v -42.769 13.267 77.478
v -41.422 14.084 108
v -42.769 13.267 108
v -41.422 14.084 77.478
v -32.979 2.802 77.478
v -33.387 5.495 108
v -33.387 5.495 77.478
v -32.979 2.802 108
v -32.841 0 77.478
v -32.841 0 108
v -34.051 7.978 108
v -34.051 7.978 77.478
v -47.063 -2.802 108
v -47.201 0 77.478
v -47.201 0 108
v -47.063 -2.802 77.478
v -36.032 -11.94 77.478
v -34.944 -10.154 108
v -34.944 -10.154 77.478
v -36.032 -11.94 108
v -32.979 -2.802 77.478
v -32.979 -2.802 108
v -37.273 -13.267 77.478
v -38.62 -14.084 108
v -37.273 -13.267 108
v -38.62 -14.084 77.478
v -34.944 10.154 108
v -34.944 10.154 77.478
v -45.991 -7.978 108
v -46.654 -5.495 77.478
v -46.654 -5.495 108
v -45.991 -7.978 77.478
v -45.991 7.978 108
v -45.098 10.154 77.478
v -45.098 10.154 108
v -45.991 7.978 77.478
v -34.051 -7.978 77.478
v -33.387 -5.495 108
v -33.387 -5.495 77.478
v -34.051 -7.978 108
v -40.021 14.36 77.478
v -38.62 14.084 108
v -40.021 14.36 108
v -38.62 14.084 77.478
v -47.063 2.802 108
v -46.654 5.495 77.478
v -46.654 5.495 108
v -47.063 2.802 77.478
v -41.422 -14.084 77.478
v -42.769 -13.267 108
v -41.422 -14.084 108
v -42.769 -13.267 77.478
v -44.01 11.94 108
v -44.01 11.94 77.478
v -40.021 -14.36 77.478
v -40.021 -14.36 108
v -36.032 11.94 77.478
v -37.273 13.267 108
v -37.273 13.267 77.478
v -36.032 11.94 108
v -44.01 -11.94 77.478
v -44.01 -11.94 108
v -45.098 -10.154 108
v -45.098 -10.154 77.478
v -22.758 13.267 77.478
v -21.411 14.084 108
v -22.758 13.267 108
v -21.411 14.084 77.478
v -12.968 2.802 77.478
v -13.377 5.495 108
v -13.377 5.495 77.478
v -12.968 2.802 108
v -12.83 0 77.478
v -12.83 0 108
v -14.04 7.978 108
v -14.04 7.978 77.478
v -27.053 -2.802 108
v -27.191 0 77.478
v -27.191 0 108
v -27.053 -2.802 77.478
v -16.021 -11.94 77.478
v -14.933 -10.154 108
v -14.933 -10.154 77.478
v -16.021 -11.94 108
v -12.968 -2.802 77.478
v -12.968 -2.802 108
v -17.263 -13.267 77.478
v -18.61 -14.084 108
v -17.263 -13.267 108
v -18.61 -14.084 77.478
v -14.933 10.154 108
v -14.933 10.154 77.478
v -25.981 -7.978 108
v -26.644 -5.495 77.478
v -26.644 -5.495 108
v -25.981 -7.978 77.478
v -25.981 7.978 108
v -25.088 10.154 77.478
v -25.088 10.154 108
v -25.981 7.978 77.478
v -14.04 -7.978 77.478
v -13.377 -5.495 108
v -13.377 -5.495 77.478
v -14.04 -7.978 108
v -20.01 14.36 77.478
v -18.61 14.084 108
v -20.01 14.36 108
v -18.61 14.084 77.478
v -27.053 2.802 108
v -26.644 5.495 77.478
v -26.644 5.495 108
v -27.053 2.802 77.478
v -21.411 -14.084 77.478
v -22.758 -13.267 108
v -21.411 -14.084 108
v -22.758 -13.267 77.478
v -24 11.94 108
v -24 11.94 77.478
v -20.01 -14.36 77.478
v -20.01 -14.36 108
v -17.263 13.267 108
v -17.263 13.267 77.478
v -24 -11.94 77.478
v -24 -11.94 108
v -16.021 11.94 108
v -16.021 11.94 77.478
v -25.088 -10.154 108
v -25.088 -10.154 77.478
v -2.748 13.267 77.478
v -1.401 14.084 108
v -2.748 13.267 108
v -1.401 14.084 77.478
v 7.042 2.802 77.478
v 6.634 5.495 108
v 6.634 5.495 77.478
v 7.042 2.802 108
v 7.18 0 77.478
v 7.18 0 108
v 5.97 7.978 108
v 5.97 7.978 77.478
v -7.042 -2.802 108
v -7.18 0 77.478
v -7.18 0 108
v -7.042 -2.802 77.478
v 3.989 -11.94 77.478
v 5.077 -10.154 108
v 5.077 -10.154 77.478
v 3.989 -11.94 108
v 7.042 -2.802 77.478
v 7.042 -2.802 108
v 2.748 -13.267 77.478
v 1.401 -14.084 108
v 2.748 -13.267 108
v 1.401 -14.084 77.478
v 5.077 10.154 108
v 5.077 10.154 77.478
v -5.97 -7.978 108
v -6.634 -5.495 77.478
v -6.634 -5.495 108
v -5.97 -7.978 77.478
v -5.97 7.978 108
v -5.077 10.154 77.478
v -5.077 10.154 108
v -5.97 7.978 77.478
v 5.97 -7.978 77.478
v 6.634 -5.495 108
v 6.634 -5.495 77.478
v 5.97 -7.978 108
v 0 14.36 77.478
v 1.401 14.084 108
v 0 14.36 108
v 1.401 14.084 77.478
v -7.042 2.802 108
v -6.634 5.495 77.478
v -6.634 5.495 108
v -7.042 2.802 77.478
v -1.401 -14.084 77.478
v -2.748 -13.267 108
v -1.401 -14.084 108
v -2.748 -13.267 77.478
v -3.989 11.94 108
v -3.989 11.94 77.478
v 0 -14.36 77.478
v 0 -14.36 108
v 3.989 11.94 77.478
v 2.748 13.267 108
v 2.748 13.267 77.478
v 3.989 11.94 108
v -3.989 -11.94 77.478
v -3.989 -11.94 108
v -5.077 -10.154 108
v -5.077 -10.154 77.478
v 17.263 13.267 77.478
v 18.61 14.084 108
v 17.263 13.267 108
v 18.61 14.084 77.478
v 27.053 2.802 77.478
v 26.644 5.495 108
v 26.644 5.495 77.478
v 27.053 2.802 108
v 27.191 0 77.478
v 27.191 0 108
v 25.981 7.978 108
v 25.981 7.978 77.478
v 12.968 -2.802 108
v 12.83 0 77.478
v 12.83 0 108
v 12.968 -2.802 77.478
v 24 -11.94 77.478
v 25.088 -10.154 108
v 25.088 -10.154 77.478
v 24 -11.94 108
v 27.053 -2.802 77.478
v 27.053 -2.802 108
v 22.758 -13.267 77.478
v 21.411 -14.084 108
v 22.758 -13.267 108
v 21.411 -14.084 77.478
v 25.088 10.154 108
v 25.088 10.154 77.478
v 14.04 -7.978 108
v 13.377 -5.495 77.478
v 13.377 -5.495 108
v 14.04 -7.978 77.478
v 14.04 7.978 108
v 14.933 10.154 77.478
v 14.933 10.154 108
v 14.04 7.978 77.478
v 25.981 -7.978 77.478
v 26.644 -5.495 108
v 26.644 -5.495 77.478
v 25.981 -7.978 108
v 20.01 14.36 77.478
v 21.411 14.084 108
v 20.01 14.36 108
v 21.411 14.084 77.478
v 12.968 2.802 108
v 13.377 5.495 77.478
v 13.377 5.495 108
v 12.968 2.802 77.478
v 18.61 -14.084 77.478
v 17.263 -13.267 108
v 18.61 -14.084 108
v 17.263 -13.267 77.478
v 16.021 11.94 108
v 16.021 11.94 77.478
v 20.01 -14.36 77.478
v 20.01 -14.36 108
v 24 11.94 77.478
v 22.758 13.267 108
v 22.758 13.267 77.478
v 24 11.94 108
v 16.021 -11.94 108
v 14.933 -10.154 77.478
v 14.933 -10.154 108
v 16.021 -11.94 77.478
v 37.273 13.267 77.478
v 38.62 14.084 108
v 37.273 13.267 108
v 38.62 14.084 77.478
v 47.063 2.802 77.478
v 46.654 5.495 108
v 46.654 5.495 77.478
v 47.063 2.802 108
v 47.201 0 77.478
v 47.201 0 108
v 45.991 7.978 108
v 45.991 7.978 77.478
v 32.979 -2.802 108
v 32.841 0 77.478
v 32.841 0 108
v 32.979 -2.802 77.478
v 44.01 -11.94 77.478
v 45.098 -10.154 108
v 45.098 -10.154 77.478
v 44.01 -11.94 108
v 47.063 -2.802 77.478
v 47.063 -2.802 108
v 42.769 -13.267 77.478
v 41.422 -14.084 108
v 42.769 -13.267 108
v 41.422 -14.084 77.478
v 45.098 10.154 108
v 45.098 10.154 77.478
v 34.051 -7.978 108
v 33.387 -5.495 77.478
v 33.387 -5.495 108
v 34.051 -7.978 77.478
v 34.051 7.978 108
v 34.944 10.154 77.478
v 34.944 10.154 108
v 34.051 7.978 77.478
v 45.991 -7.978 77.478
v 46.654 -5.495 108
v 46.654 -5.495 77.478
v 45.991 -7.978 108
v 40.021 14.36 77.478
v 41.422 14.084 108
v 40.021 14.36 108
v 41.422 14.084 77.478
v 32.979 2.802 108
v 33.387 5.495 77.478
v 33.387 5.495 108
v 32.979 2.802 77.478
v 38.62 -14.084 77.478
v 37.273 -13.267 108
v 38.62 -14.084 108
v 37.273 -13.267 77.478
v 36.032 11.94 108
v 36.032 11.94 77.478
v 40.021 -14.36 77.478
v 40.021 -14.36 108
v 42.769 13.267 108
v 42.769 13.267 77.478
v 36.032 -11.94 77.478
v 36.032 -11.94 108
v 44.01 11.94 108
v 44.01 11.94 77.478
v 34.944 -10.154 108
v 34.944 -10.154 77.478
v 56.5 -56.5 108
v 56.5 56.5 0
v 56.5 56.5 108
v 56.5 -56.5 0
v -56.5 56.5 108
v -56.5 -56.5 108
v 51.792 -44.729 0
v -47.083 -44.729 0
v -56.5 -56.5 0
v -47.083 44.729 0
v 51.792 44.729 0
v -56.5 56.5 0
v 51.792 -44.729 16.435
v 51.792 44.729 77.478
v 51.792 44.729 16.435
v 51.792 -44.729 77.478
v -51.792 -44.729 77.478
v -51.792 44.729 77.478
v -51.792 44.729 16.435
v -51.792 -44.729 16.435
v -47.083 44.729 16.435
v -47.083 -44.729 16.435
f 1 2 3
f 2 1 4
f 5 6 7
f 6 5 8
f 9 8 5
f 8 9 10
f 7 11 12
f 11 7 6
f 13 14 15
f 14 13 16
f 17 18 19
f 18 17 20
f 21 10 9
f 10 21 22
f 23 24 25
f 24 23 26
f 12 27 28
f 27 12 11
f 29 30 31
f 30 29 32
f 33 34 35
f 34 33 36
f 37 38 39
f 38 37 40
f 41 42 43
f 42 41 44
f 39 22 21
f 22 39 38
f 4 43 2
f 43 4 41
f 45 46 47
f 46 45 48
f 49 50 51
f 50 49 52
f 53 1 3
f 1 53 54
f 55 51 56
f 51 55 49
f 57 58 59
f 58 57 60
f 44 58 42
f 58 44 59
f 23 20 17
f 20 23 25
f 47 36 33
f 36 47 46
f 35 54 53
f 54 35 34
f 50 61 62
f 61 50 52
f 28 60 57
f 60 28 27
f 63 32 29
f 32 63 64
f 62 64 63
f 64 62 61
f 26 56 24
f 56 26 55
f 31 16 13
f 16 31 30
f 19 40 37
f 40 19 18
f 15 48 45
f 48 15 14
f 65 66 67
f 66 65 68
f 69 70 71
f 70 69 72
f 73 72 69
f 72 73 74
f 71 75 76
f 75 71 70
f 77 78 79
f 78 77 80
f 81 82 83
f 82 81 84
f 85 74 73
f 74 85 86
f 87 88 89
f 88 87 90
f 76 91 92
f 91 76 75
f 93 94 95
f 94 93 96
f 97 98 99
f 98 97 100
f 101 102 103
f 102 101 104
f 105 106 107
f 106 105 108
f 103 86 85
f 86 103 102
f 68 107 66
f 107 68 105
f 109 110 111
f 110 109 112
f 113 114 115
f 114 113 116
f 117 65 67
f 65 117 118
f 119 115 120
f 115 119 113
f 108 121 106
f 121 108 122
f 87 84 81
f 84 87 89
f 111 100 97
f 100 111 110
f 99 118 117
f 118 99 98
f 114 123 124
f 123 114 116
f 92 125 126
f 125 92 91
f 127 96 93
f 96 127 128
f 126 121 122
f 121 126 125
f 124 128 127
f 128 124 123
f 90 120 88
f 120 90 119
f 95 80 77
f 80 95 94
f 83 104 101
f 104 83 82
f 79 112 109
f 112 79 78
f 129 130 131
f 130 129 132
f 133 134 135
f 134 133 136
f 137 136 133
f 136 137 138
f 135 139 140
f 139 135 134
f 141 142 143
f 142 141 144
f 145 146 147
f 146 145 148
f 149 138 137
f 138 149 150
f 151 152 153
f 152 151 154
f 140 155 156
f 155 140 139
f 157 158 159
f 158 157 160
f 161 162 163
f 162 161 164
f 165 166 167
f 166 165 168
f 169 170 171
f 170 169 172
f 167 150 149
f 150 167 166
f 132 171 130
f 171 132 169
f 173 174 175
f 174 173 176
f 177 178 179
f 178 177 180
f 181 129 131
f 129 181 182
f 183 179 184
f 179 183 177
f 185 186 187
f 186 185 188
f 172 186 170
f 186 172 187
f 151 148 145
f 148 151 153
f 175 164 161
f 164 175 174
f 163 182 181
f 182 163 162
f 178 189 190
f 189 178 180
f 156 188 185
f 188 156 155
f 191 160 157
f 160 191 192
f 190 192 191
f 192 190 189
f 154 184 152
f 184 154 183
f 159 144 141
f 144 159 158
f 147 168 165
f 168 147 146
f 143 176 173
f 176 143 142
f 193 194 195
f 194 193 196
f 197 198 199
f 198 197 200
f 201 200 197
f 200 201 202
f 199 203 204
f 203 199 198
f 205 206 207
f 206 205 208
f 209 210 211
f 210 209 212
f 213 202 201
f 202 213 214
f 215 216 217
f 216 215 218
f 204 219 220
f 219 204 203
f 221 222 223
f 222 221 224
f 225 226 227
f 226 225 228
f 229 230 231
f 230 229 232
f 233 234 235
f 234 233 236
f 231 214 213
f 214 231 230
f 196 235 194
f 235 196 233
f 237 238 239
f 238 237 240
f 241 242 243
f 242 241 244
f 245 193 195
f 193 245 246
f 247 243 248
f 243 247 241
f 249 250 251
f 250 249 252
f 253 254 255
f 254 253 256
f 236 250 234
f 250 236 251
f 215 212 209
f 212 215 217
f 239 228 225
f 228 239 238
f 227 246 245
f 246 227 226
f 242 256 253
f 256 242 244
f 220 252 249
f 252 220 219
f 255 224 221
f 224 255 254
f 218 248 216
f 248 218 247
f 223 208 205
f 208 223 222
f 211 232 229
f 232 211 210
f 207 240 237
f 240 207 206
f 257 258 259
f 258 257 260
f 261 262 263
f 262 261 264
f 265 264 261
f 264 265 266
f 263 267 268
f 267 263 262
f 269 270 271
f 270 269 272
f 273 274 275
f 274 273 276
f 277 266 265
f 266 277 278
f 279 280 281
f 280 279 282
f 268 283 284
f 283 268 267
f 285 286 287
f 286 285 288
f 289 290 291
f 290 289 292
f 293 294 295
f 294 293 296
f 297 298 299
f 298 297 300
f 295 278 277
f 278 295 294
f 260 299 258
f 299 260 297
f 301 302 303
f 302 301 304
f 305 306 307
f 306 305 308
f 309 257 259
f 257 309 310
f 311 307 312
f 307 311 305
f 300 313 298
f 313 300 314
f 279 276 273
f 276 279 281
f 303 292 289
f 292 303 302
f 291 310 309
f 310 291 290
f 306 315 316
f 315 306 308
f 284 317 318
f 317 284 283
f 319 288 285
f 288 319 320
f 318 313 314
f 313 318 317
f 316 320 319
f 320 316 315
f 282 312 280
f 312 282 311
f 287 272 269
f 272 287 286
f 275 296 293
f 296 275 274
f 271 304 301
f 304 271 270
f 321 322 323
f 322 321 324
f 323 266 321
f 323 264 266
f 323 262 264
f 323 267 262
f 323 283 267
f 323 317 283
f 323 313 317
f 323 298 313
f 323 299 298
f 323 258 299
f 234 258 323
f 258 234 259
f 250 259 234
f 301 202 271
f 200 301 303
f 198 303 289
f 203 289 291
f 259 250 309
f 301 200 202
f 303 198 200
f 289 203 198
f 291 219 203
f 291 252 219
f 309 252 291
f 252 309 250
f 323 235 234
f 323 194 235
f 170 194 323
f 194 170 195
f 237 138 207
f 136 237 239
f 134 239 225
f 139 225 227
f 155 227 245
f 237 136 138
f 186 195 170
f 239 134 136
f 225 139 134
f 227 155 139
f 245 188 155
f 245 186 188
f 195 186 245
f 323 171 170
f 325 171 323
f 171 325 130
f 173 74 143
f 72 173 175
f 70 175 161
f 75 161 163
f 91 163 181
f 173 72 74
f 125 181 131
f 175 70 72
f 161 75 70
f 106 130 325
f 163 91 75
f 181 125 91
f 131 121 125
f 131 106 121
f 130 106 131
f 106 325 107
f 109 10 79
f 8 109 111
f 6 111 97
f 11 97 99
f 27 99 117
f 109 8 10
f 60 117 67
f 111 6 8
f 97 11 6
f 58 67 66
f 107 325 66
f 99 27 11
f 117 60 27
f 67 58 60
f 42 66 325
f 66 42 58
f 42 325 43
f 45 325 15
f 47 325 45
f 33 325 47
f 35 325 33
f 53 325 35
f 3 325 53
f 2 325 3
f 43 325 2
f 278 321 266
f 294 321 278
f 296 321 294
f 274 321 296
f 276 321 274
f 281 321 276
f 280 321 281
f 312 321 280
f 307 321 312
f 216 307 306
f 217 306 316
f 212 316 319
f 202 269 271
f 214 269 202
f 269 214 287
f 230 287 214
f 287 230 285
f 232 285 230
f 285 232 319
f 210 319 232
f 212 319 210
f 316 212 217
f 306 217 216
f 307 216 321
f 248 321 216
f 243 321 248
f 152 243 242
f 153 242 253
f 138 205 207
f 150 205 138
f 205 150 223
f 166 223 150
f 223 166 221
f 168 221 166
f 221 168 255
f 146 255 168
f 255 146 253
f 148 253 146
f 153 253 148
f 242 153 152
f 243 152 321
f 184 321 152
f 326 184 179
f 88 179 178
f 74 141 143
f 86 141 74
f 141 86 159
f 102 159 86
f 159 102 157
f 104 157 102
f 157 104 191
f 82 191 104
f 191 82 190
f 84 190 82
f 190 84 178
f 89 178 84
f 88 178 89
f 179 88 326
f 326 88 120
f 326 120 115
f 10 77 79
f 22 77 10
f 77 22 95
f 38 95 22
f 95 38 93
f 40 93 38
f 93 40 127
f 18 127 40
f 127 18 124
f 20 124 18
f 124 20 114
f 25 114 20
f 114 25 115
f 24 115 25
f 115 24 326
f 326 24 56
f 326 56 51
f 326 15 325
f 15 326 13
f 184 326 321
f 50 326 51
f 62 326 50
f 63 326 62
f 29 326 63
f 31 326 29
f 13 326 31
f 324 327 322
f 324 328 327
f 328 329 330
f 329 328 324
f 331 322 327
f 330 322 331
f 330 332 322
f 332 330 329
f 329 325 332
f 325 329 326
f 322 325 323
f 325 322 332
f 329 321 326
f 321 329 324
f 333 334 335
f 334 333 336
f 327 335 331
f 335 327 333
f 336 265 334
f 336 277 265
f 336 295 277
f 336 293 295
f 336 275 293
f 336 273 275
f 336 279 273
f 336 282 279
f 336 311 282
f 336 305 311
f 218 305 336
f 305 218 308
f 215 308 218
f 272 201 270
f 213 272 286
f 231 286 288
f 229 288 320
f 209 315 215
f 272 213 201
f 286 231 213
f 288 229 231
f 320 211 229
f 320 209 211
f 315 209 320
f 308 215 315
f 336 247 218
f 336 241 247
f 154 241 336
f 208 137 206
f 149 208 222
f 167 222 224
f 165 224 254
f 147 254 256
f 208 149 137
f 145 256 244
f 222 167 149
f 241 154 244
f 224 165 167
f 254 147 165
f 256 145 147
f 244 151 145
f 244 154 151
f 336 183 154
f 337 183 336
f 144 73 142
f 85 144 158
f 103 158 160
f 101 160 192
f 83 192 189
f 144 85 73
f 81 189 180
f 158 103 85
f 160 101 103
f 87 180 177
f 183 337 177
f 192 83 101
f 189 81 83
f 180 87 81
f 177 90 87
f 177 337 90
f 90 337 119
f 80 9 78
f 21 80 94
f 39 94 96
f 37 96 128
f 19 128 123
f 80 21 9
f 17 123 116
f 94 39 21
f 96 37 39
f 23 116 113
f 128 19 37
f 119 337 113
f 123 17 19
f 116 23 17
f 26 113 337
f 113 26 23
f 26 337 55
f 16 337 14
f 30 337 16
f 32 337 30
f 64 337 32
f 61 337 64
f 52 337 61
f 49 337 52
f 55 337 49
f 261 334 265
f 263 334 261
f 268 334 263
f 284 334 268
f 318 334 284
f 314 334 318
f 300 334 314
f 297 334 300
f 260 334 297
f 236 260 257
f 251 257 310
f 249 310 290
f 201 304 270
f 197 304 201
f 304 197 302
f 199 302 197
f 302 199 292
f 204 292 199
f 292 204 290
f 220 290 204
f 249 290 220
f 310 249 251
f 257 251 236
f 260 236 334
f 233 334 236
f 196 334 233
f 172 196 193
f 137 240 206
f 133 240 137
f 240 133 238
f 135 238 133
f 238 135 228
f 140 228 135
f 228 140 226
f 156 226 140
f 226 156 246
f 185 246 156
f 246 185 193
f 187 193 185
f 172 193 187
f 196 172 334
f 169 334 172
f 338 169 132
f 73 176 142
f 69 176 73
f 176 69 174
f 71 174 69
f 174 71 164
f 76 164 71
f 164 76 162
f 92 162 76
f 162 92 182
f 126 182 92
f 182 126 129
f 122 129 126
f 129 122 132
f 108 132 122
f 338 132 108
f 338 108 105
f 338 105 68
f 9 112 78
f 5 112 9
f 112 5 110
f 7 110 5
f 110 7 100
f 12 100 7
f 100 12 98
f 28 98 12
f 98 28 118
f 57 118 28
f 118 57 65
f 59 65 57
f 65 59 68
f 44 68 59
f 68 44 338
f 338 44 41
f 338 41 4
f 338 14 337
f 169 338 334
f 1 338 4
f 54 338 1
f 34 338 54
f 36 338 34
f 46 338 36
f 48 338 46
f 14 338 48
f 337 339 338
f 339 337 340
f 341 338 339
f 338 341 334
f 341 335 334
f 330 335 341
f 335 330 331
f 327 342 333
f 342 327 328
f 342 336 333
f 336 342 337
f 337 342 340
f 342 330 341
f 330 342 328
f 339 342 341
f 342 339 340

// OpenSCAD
// Propagation Vial Holder | 水培试管支架 | original parametric CAD prototype
// CAD uses millimeters/Z-up; target dimensions [width,depth,height] mm.
// Product hypothesis only; full slicer/manifold and real-print checks required.
use <lib/commerce_forms.scad>
resize([113,113,108],auto=false)
    commercial_form(family="planter",variant=3);
